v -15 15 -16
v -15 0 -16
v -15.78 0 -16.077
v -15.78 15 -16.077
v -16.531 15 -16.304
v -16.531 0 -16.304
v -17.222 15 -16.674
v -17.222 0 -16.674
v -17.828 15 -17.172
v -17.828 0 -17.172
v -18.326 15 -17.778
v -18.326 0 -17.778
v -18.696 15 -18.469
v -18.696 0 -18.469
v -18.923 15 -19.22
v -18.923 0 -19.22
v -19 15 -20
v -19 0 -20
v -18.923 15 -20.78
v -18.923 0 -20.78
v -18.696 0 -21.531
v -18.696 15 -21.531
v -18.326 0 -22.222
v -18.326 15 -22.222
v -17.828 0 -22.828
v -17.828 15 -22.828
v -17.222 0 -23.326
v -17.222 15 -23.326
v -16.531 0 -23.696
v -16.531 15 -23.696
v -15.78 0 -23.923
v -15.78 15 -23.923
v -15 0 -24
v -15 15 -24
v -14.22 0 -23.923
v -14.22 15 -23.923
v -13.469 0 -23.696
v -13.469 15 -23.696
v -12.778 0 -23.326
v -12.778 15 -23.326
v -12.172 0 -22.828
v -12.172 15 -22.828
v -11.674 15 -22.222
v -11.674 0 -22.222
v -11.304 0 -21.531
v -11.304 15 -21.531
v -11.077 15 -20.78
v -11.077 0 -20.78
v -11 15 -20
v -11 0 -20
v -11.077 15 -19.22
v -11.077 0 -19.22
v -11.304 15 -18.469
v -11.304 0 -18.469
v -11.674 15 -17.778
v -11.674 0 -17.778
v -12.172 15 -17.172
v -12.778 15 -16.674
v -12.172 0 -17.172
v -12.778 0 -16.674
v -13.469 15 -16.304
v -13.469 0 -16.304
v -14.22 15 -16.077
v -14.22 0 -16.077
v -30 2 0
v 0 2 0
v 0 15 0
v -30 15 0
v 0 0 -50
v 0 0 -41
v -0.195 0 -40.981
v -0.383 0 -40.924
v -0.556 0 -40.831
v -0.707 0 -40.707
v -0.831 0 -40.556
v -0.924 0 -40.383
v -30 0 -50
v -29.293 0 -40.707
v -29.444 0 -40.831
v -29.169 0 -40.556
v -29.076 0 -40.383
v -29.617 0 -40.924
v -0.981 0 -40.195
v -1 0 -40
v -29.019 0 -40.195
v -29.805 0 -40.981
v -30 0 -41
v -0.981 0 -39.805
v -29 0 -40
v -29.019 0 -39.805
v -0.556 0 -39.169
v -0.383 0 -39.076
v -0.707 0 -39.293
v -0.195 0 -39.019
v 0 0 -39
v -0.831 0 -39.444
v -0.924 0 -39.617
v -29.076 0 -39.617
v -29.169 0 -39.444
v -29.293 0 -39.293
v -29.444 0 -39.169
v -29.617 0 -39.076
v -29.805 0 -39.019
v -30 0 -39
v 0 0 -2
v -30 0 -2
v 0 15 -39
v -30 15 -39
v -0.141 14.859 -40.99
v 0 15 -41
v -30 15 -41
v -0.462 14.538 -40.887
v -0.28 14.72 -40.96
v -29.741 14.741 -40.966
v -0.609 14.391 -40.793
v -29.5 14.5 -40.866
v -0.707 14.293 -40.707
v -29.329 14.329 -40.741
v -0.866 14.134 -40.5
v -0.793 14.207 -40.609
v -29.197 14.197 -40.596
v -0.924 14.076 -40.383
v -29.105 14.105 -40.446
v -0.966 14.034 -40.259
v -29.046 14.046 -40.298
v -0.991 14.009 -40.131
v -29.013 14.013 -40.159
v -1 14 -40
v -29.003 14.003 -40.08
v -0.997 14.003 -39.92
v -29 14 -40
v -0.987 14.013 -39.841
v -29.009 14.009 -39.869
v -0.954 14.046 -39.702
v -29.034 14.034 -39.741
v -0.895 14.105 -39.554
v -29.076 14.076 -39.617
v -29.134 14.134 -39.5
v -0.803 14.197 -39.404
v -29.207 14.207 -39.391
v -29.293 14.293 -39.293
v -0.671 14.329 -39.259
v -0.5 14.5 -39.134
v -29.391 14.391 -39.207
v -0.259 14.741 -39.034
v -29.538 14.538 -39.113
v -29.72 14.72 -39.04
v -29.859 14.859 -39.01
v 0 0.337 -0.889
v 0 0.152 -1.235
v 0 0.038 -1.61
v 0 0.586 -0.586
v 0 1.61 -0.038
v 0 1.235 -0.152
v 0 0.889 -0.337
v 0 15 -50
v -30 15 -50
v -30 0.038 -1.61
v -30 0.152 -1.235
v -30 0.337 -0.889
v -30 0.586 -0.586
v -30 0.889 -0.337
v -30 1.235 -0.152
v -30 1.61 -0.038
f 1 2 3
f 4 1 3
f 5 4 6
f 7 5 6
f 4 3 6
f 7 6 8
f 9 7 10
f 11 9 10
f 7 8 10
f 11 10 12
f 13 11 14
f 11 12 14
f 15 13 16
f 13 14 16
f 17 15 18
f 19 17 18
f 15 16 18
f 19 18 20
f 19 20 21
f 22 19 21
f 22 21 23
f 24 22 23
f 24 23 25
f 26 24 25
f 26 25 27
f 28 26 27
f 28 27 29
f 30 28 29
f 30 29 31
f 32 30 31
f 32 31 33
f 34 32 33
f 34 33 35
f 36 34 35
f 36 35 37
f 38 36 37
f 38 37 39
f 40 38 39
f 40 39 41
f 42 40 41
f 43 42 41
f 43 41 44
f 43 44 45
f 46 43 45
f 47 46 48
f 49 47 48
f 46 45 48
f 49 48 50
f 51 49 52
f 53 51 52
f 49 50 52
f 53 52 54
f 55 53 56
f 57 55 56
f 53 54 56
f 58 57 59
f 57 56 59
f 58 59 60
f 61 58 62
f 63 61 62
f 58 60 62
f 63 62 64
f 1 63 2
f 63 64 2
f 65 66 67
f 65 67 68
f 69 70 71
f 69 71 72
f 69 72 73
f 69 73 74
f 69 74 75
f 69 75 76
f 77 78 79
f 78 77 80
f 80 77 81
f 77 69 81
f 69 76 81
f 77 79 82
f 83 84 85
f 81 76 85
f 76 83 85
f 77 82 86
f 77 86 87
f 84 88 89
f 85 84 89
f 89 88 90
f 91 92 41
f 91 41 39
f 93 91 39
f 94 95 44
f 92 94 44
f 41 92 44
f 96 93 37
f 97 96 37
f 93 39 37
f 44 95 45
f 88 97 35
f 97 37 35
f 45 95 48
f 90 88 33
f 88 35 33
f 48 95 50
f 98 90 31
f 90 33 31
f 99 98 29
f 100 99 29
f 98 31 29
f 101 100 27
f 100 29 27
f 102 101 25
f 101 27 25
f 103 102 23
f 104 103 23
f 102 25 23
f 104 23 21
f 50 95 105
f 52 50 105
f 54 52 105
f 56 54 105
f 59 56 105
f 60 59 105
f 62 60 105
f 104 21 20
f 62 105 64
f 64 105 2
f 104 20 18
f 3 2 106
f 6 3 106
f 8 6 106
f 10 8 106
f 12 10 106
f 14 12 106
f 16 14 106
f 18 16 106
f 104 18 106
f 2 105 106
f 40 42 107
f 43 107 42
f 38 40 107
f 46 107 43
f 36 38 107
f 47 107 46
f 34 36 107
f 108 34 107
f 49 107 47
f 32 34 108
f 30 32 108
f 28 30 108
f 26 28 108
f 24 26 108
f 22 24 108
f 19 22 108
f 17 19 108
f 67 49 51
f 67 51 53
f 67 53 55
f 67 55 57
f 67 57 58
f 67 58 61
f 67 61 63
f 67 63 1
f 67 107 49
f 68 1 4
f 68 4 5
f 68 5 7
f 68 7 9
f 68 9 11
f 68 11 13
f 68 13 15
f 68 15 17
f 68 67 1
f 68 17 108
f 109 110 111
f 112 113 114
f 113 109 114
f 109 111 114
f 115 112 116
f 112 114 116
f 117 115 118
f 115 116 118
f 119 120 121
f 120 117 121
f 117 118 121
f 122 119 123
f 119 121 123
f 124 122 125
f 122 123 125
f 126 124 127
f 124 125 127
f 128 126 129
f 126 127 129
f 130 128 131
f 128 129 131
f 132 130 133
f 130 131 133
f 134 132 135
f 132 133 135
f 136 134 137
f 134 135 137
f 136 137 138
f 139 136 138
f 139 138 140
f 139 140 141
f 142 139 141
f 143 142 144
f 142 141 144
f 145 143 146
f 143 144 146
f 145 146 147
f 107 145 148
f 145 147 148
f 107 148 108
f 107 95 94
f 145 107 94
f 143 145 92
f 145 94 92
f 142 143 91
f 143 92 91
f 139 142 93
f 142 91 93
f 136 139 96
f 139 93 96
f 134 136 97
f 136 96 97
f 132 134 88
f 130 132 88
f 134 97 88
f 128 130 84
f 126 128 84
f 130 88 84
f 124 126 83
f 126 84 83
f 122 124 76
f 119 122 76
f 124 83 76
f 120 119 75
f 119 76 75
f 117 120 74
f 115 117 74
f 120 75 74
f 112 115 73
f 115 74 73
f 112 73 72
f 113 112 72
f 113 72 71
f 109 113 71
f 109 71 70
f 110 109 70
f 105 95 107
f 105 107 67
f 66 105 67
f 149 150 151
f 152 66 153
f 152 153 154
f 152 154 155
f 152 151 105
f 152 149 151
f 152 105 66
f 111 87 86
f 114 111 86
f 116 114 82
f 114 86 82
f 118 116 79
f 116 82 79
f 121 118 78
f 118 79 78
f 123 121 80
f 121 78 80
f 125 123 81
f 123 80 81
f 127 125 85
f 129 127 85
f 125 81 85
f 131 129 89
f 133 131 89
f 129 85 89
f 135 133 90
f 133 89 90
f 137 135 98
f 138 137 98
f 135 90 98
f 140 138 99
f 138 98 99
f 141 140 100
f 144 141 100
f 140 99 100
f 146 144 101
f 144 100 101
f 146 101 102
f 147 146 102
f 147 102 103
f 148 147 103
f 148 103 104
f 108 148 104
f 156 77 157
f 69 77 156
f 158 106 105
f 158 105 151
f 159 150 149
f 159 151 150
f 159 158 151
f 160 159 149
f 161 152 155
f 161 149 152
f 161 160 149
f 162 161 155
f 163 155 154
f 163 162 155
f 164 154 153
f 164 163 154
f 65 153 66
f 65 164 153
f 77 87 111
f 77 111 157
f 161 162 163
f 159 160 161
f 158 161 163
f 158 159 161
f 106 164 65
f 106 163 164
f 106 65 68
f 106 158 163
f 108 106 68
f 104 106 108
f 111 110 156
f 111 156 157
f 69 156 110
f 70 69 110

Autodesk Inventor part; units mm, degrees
ref_plane "YZ Plane" through (0, 0, 0) normal (1, 0, 0) x (0, 1, 0)
ref_plane "XZ Plane" through (0, 0, 0) normal (0, 1, 0) x (-1, 0, 0)
ref_plane "XY Plane" through (0, 0, 0) normal (0, 0, 1) x (1, 0, 0)
sketch "Эскиз1" plane through (0, 0, 0) normal (0, 1, 0) x (-1, 0, 0)
  line L0 (0, 0) -> (30, 0)
  line L1 (30, 0) -> (30, -50)
  line L2 (30, -50) -> (0, -50)
  line L3 (0, -50) -> (0, 0)
  dimension "d0" = 30
  dimension "d1" = 50
extrude "Выдавливание1" add sketch "Эскиз1" along normal blind 15
fillet "Сопряжение1" radius 2 1 edges at (-15, 0, 0)
sketch "Эскиз2" plane through (0, 15, 0) normal (0, 1, 0) x (1, 0, 0)
  line L0 (-30, 0) -> (0, 0) projected
  point P0 (-15, 20)
  point P1 (-15, 0)
  dimension "d5" = 20
hole "Отверстие1" at (-15, 15, -20) direction (0, -1, 0) diameter 8 end through all
sketch "Эскиз3" plane through (0, 15, 0) normal (0, 1, 0) x (1, 0, 0)
  line L0 (-30, 0) -> (0, 0) projected
  circle A0 centre (-15, 20) radius 4 projected
  line L1 (-30, 0) -> (0, 0) projected
  line L2 (0, 0) -> (0, 50) projected
  line L3 (0, 50) -> (-30, 50) projected
  line L4 (-30, 50) -> (-30, 0) projected
  line L5 (-30, 50) -> (-30, 0) projected
  line L6 (0, 0) -> (0, 50) projected
  point P0 (-30, 40)
  point P1 (0, 40)
  dimension "d13" = 40
hole "Отверстие2" at (-30, 15, -40) at (0, 15, -40) direction (0, -1, 0) diameter 2 end through all
sketch "Эскиз4" plane through (0, 2, 0) normal (1, 0, 0) x (0, 0, -1)
  line L0 (41, 13) -> (41, -2) projected
  line L1 (39, 13) -> (41, 13) projected
  line L2 (39, -2) -> (39, 13) projected
  line L3 (41, -2) -> (39, -2) projected
  line L4 (39, 13) -> (41, 13) projected
  point P0 (0, -2)
  point P1 (40, 13)
hole "Отверстие3" at (0, 15, -40) direction (-1, 0, 0) diameter 2 end through all
properties part number "peg_half" material "Клен"
